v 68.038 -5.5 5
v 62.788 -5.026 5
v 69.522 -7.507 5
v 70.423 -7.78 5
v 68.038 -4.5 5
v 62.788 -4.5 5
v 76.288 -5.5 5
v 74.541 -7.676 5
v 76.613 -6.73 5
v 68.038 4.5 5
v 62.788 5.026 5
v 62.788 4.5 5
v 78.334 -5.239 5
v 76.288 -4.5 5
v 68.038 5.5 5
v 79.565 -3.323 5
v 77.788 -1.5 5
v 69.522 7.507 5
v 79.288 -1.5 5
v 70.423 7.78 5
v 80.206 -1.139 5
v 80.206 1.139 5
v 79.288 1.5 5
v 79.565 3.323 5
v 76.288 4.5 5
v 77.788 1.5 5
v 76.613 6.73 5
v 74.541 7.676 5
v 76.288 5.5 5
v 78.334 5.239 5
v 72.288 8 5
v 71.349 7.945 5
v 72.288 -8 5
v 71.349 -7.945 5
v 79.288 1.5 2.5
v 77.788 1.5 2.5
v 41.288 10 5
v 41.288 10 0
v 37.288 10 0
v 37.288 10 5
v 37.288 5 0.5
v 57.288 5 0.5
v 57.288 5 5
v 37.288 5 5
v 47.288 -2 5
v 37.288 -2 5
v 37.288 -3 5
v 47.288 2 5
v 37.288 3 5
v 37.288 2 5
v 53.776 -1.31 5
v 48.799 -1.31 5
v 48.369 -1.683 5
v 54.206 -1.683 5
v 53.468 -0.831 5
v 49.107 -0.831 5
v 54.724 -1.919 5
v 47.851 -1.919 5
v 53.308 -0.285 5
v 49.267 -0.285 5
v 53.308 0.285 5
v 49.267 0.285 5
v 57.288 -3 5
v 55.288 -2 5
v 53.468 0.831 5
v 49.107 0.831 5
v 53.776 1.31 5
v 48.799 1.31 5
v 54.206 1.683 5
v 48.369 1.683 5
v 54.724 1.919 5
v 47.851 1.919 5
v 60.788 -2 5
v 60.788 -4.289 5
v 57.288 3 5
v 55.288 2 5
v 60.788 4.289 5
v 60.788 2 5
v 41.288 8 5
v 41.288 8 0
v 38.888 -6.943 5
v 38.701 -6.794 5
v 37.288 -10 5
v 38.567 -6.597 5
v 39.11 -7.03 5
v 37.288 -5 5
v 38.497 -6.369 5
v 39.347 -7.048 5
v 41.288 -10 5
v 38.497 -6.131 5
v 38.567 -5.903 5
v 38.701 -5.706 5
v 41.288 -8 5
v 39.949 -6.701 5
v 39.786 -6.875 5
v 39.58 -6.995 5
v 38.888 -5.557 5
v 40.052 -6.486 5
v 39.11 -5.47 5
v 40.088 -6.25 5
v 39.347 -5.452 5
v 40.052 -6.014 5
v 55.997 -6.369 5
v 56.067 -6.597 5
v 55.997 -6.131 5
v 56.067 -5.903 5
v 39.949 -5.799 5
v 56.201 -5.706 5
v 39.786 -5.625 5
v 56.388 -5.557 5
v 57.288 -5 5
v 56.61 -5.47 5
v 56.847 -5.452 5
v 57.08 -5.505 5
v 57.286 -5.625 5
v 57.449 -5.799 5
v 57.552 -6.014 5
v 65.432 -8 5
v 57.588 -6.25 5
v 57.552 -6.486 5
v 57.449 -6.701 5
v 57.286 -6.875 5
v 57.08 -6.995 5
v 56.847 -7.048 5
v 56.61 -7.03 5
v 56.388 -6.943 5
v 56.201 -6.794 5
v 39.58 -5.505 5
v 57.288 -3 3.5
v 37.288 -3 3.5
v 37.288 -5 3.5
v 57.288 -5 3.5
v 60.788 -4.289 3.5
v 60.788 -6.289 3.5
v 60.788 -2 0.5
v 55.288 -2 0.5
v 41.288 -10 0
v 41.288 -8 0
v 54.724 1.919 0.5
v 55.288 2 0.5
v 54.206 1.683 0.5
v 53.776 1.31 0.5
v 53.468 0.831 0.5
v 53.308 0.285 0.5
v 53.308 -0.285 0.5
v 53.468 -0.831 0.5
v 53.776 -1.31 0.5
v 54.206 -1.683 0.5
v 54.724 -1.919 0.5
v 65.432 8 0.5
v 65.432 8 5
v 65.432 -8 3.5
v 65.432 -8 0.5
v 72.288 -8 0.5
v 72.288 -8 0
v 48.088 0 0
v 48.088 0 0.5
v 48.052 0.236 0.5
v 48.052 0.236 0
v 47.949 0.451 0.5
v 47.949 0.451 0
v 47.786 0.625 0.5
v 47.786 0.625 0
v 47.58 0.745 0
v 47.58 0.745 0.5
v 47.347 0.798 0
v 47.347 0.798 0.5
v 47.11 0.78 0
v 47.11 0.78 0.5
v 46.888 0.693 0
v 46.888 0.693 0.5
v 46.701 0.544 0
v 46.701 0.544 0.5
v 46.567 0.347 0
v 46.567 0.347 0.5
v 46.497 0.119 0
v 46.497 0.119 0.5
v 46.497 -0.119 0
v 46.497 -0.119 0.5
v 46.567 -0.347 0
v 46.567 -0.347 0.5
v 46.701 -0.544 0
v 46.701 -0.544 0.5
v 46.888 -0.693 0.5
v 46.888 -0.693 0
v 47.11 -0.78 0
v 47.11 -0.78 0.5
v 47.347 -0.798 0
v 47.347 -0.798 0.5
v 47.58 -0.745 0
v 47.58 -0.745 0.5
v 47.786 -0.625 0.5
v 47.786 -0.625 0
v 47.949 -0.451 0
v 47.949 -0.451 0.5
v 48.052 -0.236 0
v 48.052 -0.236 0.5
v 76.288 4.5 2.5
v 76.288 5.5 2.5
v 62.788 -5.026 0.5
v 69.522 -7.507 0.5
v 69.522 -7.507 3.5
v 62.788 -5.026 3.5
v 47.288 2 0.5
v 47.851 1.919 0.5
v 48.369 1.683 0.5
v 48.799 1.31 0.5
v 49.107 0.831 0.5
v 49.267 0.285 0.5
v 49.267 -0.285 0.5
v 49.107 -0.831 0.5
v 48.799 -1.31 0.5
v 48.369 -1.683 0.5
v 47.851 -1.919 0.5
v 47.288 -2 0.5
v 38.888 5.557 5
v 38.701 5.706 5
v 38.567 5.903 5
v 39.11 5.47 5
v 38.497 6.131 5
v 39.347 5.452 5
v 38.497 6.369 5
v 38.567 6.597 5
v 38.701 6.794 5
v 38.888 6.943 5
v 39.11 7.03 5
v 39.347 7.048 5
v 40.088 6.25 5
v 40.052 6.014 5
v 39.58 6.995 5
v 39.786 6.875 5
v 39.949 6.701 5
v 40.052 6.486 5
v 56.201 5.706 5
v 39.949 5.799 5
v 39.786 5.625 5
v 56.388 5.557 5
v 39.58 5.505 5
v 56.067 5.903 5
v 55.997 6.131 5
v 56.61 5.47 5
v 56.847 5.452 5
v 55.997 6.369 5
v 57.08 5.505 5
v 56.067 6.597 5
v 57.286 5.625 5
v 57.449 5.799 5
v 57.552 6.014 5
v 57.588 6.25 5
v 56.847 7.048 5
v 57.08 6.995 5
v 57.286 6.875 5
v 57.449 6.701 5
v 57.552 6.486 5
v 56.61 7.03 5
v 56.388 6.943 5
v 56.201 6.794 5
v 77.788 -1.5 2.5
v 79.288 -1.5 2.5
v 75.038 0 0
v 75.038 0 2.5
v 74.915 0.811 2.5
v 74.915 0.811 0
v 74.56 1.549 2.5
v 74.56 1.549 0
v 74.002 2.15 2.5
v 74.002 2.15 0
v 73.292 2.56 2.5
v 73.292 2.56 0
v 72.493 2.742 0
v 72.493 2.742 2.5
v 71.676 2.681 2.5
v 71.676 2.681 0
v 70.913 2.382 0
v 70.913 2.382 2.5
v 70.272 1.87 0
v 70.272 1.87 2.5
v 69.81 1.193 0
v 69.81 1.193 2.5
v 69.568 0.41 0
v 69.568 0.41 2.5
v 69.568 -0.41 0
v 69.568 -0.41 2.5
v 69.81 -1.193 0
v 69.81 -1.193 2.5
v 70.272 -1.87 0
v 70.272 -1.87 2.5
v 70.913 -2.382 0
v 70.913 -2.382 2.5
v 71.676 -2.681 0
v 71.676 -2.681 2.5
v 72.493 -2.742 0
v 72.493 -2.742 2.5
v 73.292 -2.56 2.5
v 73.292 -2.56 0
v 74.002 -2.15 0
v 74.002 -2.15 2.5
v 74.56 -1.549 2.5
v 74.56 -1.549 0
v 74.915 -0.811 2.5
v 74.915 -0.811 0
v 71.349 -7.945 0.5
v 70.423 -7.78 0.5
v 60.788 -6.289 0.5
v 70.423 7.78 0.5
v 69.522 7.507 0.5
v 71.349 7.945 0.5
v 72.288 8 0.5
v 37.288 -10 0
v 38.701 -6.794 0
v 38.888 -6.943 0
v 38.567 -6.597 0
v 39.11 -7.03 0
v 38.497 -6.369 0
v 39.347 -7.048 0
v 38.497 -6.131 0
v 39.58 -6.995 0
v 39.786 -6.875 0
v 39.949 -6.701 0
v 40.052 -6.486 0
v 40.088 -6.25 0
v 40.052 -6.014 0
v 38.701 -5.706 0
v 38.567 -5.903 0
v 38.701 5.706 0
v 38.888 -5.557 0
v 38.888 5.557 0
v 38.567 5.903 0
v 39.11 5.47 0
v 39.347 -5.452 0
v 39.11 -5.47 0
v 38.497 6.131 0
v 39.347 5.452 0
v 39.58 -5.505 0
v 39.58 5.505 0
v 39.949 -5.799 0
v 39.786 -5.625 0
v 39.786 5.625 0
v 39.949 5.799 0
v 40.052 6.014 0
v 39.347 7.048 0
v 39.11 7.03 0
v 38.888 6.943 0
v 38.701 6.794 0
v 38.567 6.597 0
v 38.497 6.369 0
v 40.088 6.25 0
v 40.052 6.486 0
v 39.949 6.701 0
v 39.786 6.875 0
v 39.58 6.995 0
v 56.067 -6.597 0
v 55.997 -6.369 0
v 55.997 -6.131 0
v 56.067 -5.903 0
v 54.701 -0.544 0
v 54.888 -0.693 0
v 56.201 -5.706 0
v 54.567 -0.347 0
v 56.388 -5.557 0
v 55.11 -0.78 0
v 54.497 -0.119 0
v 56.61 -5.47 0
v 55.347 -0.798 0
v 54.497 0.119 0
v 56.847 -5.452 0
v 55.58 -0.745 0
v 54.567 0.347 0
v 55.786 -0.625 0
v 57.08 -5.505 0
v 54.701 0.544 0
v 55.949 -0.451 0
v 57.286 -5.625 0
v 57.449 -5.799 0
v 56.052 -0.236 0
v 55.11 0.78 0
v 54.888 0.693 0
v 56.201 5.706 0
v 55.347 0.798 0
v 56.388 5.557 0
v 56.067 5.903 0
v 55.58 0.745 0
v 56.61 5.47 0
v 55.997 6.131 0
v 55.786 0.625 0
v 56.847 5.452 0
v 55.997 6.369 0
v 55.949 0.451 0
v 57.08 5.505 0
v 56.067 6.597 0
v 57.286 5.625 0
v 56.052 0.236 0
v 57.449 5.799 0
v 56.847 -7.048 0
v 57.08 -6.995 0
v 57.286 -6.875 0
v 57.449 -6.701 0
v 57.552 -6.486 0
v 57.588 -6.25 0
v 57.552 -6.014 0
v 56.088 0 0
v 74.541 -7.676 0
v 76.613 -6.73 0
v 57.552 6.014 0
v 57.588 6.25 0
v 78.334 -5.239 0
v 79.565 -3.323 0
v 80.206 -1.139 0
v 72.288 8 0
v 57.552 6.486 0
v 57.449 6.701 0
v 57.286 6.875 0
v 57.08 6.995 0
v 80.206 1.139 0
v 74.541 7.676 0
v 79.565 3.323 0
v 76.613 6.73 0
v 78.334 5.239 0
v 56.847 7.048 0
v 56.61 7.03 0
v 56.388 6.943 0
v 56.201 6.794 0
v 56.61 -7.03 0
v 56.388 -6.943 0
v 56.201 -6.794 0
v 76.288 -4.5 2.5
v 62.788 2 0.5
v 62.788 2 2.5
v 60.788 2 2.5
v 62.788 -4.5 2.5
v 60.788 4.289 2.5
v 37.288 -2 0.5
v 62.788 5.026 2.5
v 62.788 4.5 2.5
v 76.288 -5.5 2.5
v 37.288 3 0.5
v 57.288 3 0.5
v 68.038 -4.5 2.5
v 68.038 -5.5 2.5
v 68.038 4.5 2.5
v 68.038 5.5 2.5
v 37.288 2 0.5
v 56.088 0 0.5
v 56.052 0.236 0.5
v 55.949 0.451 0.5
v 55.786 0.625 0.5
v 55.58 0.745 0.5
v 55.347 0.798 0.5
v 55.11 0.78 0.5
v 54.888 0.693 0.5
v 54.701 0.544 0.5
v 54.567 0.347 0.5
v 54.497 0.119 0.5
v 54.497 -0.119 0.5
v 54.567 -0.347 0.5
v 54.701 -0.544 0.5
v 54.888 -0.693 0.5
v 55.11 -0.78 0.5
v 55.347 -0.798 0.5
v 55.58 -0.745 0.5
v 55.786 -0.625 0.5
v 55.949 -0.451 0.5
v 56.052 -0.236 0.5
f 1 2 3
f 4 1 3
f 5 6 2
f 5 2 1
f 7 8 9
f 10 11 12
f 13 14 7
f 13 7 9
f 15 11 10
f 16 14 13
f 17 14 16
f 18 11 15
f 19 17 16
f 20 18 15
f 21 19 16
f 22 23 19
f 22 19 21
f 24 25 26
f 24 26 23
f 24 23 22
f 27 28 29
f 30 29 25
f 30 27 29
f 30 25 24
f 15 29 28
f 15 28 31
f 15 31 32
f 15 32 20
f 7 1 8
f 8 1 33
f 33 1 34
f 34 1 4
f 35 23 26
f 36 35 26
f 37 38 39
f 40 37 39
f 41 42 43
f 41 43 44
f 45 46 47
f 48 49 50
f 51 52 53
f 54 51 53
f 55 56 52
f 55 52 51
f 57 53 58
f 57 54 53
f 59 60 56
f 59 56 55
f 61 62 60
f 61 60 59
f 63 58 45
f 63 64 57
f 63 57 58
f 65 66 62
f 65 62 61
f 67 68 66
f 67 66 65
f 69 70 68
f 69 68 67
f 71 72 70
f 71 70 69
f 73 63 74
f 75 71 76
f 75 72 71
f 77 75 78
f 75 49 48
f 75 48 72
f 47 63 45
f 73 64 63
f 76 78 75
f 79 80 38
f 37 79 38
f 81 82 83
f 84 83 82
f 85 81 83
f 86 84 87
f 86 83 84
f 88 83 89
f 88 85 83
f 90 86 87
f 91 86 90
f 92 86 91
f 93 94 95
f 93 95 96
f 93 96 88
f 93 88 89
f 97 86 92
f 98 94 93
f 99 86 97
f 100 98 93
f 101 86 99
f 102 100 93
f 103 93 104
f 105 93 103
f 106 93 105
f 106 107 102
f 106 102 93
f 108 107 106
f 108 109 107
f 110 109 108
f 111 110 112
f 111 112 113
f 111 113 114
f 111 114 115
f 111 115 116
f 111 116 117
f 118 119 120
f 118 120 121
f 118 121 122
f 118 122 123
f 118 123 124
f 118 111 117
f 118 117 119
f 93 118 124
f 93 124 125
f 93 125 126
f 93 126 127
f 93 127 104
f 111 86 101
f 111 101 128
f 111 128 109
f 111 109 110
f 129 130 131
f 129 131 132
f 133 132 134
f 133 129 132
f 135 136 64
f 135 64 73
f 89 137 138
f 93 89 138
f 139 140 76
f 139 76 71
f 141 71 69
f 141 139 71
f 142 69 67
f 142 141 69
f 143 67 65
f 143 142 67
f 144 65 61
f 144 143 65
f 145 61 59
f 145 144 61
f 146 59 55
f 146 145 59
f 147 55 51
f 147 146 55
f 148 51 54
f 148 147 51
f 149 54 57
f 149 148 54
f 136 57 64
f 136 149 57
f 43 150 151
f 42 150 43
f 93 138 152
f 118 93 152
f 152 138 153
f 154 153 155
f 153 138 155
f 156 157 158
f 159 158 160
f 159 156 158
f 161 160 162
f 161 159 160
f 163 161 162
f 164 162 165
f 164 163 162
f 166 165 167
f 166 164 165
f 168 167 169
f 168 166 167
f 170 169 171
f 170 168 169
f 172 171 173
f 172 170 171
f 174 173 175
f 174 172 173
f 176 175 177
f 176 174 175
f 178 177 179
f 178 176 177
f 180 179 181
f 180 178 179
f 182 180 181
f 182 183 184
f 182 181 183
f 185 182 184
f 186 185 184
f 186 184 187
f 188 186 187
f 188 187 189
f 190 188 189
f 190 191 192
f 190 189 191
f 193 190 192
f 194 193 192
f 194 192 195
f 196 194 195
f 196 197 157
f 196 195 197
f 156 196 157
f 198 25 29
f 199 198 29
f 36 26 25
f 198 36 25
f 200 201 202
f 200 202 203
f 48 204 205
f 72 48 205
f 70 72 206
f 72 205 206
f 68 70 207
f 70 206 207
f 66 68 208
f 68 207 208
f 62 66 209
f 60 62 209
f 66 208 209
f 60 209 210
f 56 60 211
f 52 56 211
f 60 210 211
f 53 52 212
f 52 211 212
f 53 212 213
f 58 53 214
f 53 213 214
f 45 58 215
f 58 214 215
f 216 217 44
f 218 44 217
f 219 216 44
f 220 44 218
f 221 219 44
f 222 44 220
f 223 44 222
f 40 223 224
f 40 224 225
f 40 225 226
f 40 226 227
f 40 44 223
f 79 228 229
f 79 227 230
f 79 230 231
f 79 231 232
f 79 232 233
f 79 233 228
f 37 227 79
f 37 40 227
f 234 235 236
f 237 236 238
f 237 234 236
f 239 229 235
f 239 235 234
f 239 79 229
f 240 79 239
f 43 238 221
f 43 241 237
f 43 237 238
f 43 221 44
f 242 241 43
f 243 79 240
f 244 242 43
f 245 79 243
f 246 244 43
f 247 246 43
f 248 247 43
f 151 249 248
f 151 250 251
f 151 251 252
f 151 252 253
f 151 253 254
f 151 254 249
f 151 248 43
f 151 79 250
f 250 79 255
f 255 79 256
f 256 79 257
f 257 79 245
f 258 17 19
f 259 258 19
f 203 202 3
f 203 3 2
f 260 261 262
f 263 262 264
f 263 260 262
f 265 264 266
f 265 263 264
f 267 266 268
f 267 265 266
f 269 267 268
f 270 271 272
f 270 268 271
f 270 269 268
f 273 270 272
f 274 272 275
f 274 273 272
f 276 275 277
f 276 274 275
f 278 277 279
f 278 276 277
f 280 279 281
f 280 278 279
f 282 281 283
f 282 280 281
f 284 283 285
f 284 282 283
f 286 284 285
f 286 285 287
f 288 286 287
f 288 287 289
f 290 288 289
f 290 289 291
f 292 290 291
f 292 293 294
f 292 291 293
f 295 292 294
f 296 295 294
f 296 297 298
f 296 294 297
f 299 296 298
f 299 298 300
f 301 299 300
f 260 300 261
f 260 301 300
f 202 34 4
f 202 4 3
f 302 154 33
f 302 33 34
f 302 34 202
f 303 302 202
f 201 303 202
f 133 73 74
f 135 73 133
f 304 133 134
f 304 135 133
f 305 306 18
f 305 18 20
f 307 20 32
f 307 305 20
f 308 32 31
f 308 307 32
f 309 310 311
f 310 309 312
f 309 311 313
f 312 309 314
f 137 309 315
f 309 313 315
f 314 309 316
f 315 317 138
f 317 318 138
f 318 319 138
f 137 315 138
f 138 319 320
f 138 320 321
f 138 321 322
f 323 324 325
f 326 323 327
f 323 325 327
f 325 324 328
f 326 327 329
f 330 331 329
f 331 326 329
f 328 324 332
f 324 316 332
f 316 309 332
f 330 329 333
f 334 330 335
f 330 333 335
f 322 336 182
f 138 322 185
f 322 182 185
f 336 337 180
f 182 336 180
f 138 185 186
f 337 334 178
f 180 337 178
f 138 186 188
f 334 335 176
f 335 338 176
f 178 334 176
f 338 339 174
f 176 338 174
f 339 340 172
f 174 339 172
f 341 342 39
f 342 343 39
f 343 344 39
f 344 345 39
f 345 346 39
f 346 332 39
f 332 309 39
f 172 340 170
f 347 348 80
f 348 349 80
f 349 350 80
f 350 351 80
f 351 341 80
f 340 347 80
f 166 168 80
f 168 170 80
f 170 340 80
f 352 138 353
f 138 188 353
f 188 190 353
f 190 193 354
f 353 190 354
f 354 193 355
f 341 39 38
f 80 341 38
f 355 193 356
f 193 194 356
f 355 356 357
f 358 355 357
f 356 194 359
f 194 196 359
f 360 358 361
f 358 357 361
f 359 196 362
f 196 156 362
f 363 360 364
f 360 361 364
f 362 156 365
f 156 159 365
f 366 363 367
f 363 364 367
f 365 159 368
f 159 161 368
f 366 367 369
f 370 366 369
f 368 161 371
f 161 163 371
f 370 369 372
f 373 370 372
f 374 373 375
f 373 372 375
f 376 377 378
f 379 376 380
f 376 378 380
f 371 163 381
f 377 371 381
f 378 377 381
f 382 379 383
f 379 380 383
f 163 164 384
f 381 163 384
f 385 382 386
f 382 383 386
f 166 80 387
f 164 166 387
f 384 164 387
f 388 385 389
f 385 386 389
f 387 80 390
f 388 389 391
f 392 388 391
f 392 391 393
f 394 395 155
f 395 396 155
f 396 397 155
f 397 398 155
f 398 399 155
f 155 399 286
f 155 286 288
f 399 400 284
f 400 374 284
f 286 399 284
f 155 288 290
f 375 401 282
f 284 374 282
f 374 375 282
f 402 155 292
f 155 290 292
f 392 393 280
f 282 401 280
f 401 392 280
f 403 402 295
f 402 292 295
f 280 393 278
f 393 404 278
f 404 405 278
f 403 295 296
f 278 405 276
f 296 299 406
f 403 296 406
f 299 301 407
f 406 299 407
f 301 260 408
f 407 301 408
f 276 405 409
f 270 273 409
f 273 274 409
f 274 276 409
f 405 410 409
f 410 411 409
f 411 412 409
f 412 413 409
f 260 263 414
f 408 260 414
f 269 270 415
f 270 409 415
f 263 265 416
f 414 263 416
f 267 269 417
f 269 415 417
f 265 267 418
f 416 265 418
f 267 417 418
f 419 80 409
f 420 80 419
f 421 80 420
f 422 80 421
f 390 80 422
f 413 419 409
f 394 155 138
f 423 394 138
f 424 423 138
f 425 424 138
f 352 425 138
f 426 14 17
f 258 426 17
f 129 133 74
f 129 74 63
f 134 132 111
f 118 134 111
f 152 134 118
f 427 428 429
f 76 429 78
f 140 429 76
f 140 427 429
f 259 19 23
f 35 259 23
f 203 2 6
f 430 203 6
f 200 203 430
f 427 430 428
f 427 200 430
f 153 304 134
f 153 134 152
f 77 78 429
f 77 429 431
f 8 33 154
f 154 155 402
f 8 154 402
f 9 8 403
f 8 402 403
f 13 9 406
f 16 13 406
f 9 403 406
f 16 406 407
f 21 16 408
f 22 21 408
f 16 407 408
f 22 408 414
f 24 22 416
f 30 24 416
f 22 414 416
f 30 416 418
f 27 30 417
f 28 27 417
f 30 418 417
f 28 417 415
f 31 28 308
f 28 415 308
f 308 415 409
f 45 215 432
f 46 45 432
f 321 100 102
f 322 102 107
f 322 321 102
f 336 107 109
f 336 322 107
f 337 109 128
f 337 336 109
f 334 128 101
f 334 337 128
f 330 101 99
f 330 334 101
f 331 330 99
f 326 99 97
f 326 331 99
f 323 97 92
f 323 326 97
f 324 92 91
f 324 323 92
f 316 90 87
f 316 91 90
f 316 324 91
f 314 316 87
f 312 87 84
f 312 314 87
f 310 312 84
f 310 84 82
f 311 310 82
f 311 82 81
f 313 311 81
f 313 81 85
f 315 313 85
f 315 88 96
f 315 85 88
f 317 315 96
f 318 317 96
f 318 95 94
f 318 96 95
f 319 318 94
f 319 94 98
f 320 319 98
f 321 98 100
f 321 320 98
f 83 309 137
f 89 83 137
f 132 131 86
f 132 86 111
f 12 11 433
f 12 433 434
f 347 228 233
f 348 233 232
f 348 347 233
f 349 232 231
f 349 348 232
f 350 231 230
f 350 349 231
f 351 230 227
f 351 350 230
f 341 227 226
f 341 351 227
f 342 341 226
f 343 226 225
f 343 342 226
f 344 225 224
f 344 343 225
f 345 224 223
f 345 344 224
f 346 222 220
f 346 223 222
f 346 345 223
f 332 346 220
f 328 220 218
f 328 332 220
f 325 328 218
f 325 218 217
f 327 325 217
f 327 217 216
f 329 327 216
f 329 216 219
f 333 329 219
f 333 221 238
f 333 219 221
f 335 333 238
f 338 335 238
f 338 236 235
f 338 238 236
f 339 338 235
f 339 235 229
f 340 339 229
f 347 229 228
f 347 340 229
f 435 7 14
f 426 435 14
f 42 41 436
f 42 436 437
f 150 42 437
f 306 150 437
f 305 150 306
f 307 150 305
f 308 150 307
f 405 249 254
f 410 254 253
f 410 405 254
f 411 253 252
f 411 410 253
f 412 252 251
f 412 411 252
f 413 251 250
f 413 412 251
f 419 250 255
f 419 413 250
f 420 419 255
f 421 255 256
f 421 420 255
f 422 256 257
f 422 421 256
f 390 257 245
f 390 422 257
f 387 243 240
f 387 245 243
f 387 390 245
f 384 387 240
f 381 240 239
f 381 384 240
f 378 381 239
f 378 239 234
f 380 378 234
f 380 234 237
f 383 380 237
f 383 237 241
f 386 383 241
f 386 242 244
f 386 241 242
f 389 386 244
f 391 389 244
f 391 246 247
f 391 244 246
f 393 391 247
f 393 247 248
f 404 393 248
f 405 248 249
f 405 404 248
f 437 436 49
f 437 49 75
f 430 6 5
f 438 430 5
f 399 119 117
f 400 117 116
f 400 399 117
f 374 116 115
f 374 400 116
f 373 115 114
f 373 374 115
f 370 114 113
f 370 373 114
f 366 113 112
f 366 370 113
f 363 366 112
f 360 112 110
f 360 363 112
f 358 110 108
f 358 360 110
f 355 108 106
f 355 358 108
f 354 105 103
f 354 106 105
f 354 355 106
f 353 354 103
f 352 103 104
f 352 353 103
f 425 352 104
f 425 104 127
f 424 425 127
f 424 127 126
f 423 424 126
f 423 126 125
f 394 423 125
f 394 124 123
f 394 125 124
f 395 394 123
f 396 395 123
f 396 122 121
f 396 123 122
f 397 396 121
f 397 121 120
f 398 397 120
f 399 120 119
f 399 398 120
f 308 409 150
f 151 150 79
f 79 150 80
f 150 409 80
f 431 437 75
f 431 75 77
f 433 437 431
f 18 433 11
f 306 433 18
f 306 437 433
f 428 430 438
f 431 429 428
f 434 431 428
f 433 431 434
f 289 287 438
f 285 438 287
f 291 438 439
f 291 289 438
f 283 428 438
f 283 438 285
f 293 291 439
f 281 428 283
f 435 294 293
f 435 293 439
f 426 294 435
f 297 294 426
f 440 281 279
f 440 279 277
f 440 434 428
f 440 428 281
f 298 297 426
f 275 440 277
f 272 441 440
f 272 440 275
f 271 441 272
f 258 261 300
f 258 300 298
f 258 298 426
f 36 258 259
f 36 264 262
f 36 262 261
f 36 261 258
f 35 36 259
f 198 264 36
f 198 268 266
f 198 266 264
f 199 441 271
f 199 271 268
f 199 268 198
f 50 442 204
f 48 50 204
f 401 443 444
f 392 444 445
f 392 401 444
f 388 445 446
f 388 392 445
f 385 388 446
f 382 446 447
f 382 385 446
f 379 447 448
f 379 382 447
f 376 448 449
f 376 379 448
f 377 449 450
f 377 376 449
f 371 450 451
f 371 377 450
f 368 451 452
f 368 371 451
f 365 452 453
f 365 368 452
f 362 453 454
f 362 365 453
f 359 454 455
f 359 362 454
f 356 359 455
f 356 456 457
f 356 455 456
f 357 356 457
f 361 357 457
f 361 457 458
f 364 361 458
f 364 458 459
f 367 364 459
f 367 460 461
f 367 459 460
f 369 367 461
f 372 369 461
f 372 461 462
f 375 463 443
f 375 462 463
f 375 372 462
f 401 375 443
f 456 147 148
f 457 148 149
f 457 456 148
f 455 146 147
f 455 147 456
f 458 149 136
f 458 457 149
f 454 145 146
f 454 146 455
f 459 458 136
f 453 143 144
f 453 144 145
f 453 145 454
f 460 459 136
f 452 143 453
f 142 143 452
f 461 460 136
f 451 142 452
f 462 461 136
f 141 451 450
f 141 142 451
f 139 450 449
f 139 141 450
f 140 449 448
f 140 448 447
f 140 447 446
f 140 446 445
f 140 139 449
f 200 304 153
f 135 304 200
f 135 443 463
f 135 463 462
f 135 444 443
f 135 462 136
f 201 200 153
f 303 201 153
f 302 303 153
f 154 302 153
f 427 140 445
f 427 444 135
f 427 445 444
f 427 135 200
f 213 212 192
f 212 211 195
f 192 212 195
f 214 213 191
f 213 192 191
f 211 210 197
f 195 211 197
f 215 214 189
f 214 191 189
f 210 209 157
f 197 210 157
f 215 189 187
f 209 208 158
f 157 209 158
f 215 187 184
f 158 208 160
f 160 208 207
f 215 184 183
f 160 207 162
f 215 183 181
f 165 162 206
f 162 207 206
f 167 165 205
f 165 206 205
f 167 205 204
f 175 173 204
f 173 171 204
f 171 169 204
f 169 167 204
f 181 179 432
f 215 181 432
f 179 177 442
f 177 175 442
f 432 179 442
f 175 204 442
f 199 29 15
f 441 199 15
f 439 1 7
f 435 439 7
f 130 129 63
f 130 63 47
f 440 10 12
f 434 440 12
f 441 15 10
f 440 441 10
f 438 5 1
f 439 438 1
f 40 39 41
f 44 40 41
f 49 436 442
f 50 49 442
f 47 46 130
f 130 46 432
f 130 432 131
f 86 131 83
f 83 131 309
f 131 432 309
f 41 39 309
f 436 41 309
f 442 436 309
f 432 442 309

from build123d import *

# Parameters (mm, degrees)
BOSS_EXTRUDE1_DEPTH              = 5
SKETCH4_R                        = 2.75
POT_HOLE_DEPTH                   = 82.062316455
POT_START                        = 5
POT_INSERT_DEPTH                 = 2.5
MIDDLE_START                     = 3.5
MIDDLE_FLEXION_DEPTH             = 2.5
MIDDLE_START_2                   = 0.5
MIDDLE_EXTENSION_DEPTH           = 5.5
PROXIMAL_START                   = 0.5
PROXIMAL_FLEXION_EXTENSION_DEPTH = 5.5
SKETCH9_R                        = 0.8
SCREW_HOLES_DEPTH                = 82.062316455
CUT_EXTRUDE4_START               = 0.5
CUT_EXTRUDE4_DEPTH               = 5.5
CUT_EXTRUDE5_START               = 5
CUT_EXTRUDE5_DEPTH               = 2.5


with BuildPart() as part:
    # Sketch1 → Boss-Extrude1 (new body)
    with BuildSketch(Plane.XY):
        with BuildLine():
            Line((72.287602711, 8), (41.287602711, 8))
            Line((41.287602711, 8), (41.287602711, 10))
            Line((41.287602711, 10), (37.287602711, 10))
            Line((37.287602711, 10), (37.287602711, -10))
            Line((37.287602711, -10), (41.287602711, -10))
            Line((41.287602711, -10), (41.287602711, -8))
            Line((41.287602711, -8), (72.287602711, -8))
            ThreePointArc((72.287602711, -8), (80.287602711, 0), (72.287602711, 8))
        make_face()
    extrude(amount=BOSS_EXTRUDE1_DEPTH)

    # Sketch4 → Pot Hole (cut, through all)
    with BuildSketch(Plane.XY):
        with Locations((72.287602711, 0)):
            Circle(SKETCH4_R)
    extrude(amount=POT_HOLE_DEPTH, mode=Mode.SUBTRACT)

    # Sketch3 → Pot Insert (cut)
    with BuildSketch(Plane(origin=(28.28760271, 0, 0), x_dir=(1, 0, 0), z_dir=(0, 0, 1)).offset(POT_START)):
        Polygon((51.000000001, 0), (51.000000001, 1.5), (49.500000001, 1.5), (48.000000001, 4.5), (48.000000001, 5.5), (44.000000001, 5.5), (39.750000001, 5.5), (39.750000001, 4.5), (34.500000001, 4.5), (34.500000001, 0), (34.500000001, -4.5), (39.750000001, -4.5), (39.750000001, -5.5), (44.000000001, -5.5), (48.000000001, -5.5), (48.000000001, -4.5), (49.500000001, -1.5), (51.000000001, -1.5), align=None)
    extrude(amount=-POT_INSERT_DEPTH, mode=Mode.SUBTRACT)

    # Sketch16 → Middle Flexion (cut)
    with BuildSketch(Plane.XY.offset(MIDDLE_START)):
        with BuildLine():
            Line((65.431633901, -8), (72.287602711, -8))
            ThreePointArc((72.287602711, -8), (70.883144469, -7.875753744), (69.522310897, -7.506874262))
            Line((69.522310897, -7.506874262), (57.287602711, -3))
            Line((57.287602711, -3), (37.287602711, -3))
            Line((37.287602711, -3), (37.287602711, -5))
            Line((37.287602711, -5), (57.287602711, -5))
            Line((57.287602711, -5), (65.431633901, -8))
        make_face()
    extrude(amount=MIDDLE_FLEXION_DEPTH, mode=Mode.SUBTRACT)

    # Sketch11 → Middle Extension (cut)
    with BuildSketch(Plane.XY.offset(MIDDLE_START_2)):
        with BuildLine():
            Line((57.287602711, 5.000000001), (37.287602711, 5.000000001))
            Line((37.287602711, 5.000000001), (37.287602711, 3.000000001))
            Line((37.287602711, 3.000000001), (57.287602711, 3.000000001))
            Line((57.287602711, 3.000000001), (69.522310897, 7.506874262))
            ThreePointArc((69.522310897, 7.506874262), (70.88314447, 7.875753745), (72.287602711, 8))
            Line((72.287602711, 8), (65.4316339, 8))
            Line((65.4316339, 8), (57.287602711, 5.000000001))
        make_face()
    extrude(amount=MIDDLE_EXTENSION_DEPTH, mode=Mode.SUBTRACT)

    # Sketch8 → Proximal Flexion/Extension (cut)
    with BuildSketch(Plane.XY.offset(PROXIMAL_START)):
        with BuildLine():
            ThreePointArc((47.287602711, 2), (49.287602711, 0), (47.287602711, -2))
            Line((47.287602711, -2), (37.287602711, -2))
            Line((37.287602711, -2), (37.287602711, 0))
            Line((37.287602711, 0), (37.287602711, 2))
            Line((37.287602711, 2), (47.287602711, 2))
        make_face()
    extrude(amount=PROXIMAL_FLEXION_EXTENSION_DEPTH, mode=Mode.SUBTRACT)

    # Sketch9 → Screw Holes (cut, through all)
    with BuildSketch(Plane.XY):
        with Locations((47.287602711, 0)):
            Circle(SKETCH9_R)
        with Locations((56.787602711, -6.25)):
            Circle(SKETCH9_R)
        with Locations((39.287602711, -6.25)):
            Circle(SKETCH9_R)
        with Locations((55.287602711, 0)):
            Circle(SKETCH9_R)
        with Locations((39.287602711, 6.25)):
            Circle(SKETCH9_R)
        with Locations((56.787602711, 6.25)):
            Circle(SKETCH9_R)
    extrude(amount=SCREW_HOLES_DEPTH, mode=Mode.SUBTRACT)

    # Sketch12 → Cut-Extrude4 (cut)
    with BuildSketch(Plane.XY.offset(CUT_EXTRUDE4_START)):
        with BuildLine():
            Line((62.787602711, 2), (60.787602711, 2))
            Line((60.787602711, 2), (55.287602711, 2))
            ThreePointArc((55.287602711, 2), (53.287602711, 0), (55.287602711, -2))
            Line((55.287602711, -2), (60.787602711, -2))
            Line((60.787602711, -2), (60.787602711, -6.289287793))
            Line((60.787602711, -6.289287793), (65.431633901, -8))
            Line((65.431633901, -8), (72.287602711, -8))
            ThreePointArc((72.287602711, -8), (70.883144469, -7.875753745), (69.522310897, -7.506874262))
            Line((69.522310897, -7.506874262), (62.787602711, -5.026023675))
            Line((62.787602711, -5.026023675), (62.787602711, 2))
        make_face()
    extrude(amount=CUT_EXTRUDE4_DEPTH, mode=Mode.SUBTRACT)

    # Sketch13 → Cut-Extrude5 (cut)
    with BuildSketch(Plane.XY.offset(CUT_EXTRUDE5_START)):
        Polygon((62.787602711, 2), (60.787602711, 2), (60.787602711, 4.289287794), (62.787602711, 5.026023675), align=None)
    extrude(amount=-CUT_EXTRUDE5_DEPTH, mode=Mode.SUBTRACT)


solid = part.part
